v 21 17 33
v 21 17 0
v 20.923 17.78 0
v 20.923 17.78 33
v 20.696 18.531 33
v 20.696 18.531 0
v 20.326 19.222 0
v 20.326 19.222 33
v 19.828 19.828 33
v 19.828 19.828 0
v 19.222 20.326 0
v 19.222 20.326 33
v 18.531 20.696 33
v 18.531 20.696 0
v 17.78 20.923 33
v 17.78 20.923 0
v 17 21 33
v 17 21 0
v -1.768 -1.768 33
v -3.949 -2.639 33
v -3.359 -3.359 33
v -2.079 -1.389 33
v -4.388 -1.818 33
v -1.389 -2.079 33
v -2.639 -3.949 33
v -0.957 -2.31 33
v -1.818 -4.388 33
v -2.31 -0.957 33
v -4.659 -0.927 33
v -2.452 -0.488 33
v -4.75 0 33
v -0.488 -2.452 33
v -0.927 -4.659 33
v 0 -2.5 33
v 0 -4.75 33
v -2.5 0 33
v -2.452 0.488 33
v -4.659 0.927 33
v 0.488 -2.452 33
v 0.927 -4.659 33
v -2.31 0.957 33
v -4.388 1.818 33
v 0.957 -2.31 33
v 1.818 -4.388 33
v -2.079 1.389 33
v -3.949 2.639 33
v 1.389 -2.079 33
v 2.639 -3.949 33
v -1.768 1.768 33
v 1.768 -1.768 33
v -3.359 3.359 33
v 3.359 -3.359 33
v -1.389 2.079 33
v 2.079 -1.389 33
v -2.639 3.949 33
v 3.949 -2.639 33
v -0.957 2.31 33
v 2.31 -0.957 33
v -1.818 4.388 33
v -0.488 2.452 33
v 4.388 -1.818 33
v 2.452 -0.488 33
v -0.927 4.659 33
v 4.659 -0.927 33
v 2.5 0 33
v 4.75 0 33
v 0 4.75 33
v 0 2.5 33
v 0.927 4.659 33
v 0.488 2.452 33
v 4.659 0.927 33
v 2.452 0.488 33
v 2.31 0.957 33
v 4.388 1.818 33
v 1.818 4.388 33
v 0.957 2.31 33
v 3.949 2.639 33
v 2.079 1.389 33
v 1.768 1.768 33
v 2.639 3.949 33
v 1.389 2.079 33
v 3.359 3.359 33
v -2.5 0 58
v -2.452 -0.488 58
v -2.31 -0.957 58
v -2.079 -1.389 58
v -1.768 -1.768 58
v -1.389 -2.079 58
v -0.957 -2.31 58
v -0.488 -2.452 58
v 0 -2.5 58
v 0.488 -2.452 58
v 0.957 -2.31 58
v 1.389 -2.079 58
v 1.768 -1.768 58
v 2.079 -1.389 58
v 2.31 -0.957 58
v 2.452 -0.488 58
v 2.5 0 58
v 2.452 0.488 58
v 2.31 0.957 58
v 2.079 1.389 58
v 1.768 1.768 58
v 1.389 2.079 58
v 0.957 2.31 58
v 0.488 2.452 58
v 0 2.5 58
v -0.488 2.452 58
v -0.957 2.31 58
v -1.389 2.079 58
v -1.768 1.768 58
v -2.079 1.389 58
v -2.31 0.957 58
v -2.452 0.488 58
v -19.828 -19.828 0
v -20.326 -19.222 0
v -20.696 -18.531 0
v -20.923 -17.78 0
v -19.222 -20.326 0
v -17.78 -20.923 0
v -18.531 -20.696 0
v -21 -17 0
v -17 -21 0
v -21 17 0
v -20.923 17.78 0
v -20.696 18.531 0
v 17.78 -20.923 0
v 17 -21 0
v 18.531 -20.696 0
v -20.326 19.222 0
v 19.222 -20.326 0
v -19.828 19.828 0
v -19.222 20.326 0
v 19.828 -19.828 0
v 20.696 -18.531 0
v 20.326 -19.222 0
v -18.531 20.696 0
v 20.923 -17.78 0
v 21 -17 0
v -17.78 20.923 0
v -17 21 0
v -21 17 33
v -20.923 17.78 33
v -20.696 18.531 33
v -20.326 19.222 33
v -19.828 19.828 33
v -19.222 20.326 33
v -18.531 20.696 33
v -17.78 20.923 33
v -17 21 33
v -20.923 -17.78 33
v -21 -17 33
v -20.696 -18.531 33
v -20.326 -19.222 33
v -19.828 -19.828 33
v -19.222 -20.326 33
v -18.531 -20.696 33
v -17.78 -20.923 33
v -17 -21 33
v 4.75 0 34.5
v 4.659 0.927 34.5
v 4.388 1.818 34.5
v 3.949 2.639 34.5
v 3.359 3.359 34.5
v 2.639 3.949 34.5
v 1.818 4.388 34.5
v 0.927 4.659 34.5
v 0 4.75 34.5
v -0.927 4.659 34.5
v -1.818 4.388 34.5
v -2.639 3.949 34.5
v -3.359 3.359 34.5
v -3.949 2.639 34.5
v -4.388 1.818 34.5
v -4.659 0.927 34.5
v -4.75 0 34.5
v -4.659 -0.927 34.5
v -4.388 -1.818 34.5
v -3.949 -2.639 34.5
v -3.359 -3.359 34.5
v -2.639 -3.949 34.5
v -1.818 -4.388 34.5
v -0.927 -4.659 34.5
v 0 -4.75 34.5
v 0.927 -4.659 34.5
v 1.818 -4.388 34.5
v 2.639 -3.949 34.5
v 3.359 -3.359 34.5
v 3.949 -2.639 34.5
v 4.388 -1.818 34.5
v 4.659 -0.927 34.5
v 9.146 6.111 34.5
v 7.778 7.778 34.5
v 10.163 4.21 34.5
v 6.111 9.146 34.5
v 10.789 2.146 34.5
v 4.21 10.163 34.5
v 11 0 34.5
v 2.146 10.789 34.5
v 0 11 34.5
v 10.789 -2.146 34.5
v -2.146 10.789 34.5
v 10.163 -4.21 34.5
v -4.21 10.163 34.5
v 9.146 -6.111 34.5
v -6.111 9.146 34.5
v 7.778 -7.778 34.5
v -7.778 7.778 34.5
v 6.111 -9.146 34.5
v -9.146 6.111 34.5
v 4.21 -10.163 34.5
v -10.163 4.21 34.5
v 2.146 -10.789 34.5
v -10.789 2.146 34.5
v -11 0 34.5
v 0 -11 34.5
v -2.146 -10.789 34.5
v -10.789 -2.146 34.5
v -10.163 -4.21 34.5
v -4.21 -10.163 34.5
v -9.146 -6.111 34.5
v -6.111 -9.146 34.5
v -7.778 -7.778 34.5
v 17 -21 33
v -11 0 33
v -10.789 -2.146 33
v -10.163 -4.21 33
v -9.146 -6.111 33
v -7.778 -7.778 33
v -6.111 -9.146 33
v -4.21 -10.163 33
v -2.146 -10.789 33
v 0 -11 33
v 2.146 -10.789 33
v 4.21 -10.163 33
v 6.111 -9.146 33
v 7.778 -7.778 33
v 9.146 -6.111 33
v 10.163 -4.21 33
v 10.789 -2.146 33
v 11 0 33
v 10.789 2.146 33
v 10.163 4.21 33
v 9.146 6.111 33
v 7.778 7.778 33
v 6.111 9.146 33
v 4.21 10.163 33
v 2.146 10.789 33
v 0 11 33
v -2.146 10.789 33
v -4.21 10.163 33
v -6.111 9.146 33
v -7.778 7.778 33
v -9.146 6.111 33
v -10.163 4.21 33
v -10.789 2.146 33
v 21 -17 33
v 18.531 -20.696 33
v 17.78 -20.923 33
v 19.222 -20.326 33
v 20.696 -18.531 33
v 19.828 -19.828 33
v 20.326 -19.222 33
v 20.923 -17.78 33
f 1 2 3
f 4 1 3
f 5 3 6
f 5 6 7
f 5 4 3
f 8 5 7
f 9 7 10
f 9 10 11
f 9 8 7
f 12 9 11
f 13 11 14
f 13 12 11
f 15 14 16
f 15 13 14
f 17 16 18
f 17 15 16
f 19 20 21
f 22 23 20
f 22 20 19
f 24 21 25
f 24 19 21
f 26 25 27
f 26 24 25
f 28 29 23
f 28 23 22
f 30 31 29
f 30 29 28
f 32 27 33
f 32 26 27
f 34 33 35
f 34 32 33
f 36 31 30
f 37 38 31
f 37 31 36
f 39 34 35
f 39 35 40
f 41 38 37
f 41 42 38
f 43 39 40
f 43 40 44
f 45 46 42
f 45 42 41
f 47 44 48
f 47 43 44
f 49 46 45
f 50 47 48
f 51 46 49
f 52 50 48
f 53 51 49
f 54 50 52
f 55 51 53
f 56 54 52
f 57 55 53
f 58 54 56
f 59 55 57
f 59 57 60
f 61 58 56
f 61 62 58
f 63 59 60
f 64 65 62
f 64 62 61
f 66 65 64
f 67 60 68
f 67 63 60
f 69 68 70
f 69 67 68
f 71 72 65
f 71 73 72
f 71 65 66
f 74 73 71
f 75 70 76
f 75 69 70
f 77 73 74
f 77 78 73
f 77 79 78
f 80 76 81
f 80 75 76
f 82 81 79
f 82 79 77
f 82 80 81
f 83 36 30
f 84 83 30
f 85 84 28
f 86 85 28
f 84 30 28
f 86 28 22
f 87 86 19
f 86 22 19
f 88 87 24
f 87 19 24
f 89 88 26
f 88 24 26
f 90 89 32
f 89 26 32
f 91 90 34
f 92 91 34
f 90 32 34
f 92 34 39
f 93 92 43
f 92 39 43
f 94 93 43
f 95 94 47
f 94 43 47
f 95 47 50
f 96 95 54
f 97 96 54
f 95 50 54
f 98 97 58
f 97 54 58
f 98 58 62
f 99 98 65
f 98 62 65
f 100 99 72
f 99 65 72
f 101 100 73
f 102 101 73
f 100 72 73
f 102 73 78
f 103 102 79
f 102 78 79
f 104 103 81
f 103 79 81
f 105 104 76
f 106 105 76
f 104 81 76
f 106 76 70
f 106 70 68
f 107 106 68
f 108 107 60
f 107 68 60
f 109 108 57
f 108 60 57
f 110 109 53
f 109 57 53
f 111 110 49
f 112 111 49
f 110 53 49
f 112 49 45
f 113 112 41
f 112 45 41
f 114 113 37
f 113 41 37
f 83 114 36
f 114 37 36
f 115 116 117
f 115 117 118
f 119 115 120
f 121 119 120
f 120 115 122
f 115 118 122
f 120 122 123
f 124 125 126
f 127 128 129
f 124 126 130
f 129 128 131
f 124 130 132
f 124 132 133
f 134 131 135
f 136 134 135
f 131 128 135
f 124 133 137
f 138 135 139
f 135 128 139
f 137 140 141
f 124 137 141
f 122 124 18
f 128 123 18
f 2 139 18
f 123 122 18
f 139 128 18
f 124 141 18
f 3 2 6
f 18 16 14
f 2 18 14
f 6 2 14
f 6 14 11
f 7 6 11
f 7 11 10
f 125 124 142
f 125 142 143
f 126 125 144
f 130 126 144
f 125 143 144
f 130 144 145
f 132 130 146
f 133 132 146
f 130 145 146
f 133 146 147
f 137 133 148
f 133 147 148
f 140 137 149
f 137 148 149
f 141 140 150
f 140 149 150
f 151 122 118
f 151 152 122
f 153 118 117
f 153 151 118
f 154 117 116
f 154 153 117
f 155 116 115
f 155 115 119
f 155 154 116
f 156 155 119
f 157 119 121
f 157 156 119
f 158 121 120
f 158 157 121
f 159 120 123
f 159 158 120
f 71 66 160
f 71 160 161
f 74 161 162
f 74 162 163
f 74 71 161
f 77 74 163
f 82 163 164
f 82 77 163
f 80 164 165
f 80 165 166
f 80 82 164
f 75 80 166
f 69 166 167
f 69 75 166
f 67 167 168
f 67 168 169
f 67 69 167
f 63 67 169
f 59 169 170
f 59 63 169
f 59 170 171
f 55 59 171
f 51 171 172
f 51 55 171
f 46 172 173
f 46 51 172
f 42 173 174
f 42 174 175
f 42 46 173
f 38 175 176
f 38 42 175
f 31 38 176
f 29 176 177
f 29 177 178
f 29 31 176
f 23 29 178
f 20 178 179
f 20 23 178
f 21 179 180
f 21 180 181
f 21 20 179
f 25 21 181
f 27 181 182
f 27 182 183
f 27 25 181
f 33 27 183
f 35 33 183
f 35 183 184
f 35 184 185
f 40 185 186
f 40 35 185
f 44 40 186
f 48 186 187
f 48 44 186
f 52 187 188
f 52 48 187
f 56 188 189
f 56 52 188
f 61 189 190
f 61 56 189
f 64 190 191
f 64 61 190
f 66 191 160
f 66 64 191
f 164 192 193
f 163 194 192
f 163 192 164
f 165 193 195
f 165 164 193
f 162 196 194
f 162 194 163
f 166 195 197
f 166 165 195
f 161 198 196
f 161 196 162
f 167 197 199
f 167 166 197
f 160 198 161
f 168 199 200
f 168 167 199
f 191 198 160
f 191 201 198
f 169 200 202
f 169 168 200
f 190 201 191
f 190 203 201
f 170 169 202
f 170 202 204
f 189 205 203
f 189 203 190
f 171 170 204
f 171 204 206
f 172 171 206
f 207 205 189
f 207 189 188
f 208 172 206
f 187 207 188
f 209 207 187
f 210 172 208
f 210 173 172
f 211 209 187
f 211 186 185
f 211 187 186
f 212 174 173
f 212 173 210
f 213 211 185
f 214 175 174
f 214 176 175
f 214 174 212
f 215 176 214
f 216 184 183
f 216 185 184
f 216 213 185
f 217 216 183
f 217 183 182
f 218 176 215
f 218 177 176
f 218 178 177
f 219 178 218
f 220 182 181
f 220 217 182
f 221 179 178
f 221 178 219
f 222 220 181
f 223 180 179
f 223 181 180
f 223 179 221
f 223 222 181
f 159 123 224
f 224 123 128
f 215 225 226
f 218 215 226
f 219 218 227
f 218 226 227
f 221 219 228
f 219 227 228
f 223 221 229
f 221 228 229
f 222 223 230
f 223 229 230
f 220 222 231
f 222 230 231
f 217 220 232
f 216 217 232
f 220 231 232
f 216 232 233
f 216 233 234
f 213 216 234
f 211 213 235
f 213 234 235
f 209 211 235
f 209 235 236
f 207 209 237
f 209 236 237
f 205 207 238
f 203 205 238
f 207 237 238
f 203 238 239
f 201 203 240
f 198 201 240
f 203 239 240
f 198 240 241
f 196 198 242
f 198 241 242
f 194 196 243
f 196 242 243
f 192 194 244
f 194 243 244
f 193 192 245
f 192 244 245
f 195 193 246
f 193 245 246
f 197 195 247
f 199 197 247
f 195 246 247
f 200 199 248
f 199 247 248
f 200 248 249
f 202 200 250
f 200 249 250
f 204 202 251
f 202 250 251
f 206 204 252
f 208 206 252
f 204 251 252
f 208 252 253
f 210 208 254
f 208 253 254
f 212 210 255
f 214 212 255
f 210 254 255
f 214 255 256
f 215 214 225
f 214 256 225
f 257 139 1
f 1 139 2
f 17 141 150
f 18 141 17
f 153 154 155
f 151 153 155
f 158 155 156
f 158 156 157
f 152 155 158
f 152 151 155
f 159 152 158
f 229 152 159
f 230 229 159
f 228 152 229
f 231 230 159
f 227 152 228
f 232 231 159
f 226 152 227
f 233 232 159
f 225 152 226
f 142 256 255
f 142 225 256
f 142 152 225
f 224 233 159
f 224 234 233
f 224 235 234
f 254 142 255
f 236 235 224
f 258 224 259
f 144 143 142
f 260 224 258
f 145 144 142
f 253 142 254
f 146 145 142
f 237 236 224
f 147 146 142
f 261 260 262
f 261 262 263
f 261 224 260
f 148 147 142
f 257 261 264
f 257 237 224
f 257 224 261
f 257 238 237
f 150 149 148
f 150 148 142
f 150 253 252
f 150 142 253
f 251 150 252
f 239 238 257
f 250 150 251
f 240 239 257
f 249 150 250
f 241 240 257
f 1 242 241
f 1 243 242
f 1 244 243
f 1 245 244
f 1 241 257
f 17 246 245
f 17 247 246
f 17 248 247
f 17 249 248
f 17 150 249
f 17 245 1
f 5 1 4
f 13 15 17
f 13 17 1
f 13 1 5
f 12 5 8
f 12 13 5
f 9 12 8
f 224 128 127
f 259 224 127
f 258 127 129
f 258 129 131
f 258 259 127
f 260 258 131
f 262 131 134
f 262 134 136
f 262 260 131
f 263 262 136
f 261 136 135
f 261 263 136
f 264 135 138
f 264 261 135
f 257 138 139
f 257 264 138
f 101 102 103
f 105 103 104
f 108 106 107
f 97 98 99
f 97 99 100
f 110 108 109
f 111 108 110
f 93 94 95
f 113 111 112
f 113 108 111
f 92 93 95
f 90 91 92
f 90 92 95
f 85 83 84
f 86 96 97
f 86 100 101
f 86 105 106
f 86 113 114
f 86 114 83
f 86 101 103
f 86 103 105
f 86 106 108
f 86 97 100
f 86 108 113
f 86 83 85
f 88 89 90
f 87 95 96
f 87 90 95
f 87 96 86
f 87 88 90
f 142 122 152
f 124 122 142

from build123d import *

# Parameters (mm, degrees)
CROQUIS1_W              = 42
CROQUIS1_H              = 42
SALIENTE_EXTRUIR1_DEPTH = 33
REDONDEO1_R             = 4
CROQUIS2_R              = 11
CROQUIS2_R_2            = 4.75
SALIENTE_EXTRUIR2_DEPTH = 1.5
CROQUIS2_4_R            = 2.5
SALIENTE_EXTRUIR3_DEPTH = 25


with BuildPart() as part:
    # Croquis1 → Saliente-Extruir1 (new body)
    with BuildSketch(Plane.XY):
        Rectangle(CROQUIS1_W, CROQUIS1_H)
    extrude(amount=SALIENTE_EXTRUIR1_DEPTH)

    # Redondeo1
    redondeo1_edges = [part.edges().sort_by_distance(p)[0] for p in [
        (-21, -21, 16.5),
        (21, -21, 16.5),
        (21, 21, 16.5),
        (-21, 21, 16.5),
    ]]
    fillet(redondeo1_edges, radius=REDONDEO1_R)

    # Croquis2 → Saliente-Extruir2 (add)
    with BuildSketch(Plane.XY.offset(33)):
        Circle(CROQUIS2_R)
        Circle(CROQUIS2_R_2, mode=Mode.SUBTRACT)
    extrude(amount=SALIENTE_EXTRUIR2_DEPTH)

    # Croquis2<4> → Saliente-Extruir3 (add)
    with BuildSketch(Plane.XY.offset(33)):
        Circle(CROQUIS2_4_R)
    extrude(amount=SALIENTE_EXTRUIR3_DEPTH)


solid = part.part
